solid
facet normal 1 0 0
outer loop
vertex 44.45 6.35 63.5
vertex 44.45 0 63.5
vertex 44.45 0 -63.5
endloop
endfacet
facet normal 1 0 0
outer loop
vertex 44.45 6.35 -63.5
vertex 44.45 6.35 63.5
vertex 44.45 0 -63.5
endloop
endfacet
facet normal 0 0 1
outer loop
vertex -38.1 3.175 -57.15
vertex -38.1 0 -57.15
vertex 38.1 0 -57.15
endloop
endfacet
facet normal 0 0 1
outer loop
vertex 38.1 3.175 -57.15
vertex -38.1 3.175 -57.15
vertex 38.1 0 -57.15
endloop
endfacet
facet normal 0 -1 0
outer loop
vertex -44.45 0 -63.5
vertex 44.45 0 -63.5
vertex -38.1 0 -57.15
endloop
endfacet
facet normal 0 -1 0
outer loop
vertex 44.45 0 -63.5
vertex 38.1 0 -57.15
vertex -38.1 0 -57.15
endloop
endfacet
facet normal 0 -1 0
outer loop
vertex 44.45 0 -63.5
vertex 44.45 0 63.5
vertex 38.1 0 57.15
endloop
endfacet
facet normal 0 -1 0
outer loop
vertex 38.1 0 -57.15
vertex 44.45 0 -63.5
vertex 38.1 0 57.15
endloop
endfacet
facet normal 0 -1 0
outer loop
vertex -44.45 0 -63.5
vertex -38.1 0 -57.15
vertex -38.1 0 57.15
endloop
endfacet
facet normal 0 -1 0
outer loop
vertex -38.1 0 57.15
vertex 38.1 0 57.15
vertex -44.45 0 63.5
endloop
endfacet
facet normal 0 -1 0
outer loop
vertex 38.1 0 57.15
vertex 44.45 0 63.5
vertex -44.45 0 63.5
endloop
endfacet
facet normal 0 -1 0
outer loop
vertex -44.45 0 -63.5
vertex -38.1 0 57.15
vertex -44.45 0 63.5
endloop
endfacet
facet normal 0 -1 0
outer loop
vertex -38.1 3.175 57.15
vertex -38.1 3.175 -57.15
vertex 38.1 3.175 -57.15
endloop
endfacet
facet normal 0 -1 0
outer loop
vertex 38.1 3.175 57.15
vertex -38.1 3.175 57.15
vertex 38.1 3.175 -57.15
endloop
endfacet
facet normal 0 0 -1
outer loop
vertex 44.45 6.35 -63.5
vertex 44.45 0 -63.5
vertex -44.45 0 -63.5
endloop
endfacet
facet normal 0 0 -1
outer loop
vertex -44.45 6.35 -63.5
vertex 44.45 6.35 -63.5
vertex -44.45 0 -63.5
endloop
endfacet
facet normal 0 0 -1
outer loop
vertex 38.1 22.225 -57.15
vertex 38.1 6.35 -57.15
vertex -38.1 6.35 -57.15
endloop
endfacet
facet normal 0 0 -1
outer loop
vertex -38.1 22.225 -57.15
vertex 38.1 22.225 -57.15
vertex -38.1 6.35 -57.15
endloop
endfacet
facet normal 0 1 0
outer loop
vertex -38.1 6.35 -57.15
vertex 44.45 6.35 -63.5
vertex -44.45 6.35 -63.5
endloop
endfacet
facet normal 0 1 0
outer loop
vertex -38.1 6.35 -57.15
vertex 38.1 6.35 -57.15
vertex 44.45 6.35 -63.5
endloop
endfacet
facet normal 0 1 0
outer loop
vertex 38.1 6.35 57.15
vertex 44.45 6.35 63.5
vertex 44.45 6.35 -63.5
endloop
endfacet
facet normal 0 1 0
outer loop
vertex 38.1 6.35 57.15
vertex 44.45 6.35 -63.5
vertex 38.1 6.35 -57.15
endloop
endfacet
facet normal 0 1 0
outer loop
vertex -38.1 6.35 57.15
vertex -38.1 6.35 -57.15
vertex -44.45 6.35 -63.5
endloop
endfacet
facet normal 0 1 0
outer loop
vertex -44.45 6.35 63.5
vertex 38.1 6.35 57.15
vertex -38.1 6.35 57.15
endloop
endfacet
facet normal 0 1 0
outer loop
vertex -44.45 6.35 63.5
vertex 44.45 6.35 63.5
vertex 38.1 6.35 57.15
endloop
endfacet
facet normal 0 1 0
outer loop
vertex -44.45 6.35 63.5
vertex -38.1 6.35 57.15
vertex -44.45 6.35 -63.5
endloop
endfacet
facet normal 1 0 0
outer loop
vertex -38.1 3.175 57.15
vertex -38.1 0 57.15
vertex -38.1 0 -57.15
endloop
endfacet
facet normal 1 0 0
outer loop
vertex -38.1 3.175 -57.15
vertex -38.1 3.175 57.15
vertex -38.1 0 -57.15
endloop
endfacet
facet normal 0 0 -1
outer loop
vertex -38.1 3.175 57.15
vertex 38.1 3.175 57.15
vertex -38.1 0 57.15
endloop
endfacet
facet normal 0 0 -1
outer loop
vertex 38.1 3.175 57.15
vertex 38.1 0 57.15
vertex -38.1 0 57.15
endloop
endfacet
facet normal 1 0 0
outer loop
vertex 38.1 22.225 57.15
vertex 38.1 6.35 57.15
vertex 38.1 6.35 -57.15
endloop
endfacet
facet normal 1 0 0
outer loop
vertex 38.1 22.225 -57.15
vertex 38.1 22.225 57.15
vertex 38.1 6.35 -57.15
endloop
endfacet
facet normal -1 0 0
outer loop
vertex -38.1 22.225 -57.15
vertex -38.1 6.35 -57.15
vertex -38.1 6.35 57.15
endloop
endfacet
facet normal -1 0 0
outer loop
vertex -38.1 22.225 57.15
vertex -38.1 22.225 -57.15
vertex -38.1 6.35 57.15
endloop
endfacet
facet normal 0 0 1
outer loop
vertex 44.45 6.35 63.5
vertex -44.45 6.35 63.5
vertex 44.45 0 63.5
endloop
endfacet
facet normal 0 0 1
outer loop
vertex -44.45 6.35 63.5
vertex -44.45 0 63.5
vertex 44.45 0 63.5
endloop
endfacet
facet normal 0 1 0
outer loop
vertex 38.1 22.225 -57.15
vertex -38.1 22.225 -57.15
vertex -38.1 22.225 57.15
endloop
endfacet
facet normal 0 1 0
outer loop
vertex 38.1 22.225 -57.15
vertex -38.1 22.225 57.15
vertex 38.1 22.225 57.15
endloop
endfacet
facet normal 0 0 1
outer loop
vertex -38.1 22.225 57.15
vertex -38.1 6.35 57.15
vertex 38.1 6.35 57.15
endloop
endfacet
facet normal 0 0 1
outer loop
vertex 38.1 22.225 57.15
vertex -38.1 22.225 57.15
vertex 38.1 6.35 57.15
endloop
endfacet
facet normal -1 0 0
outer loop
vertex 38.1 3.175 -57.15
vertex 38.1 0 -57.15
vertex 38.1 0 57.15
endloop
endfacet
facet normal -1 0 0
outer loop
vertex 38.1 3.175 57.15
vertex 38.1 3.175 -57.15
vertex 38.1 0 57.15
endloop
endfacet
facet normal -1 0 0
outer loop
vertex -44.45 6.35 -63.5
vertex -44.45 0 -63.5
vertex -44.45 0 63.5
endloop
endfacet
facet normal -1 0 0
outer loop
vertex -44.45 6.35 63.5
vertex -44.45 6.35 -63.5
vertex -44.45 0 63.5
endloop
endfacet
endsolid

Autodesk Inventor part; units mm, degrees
ref_plane "YZ Plane" through (0, 0, 0) normal (1, 0, 0) x (0, 1, 0)
ref_plane "XZ Plane" through (0, 0, 0) normal (0, 1, 0) x (-1, 0, 0)
ref_plane "XY Plane" through (0, 0, 0) normal (0, 0, 1) x (1, 0, 0)
sketch "Sketch1" plane through (0, 0, 0) normal (0, 1, 0) x (-1, 0, 0)
  line L0 (-38.1, 57.15) -> (38.1, 57.15)
  line L1 (38.1, 57.15) -> (38.1, -57.15)
  line L2 (38.1, -57.15) -> (-38.1, -57.15)
  line L3 (-38.1, -57.15) -> (-38.1, 57.15)
  line L4 (-38.1, 57.15) -> (38.1, -57.15) construction
  line L5 (38.1, 57.15) -> (-38.1, -57.15) construction
  line L6 (44.45, -63.5) -> (44.45, 63.5)
  line L7 (44.45, 63.5) -> (-44.45, 63.5)
  line L8 (-44.45, 63.5) -> (-44.45, -63.5)
  line L9 (-44.45, -63.5) -> (44.45, -63.5)
  point P0 (0, 0)
  dimension "d0" = 76.2
  dimension "d1" = 114.3
  dimension "d2" = 6.35
extrude "Extrusion1" add sketch "Sketch1" along normal blind 6.35
sketch "Sketch2" plane through (0, 6.35, 0) normal (0, 1, 0) x (1, 0, 0)
  line L0 (-38.1, -57.15) -> (-38.1, 57.15) projected
  line L1 (-38.1, 57.15) -> (38.1, 57.15) projected
  line L2 (38.1, 57.15) -> (38.1, -57.15) projected
  line L3 (38.1, -57.15) -> (-38.1, -57.15) projected
  line L4 (-44.45, 63.5) -> (-44.45, -63.5) projected
  line L5 (-44.45, -63.5) -> (44.45, -63.5) projected
  line L6 (44.45, -63.5) -> (44.45, 63.5) projected
  line L7 (44.45, 63.5) -> (-44.45, 63.5) projected
  point P0 (0, 0)
extrude "Extrusion2" add sketch "Sketch2" along normal mid plane 6.35 contours L0 L1 L2 L3
sketch "Sketch3" plane through (0, 9.525, 0) normal (0, 1, 0) x (1, 0, 0)
  line L0 (-38.1, 57.15) -> (-38.1, -57.15) projected
  line L1 (-38.1, -57.15) -> (38.1, -57.15) projected
  line L2 (38.1, -57.15) -> (38.1, 57.15) projected
  line L3 (38.1, 57.15) -> (-38.1, 57.15) projected
  point P0 (0, 0)
extrude "Extrusion3" add sketch "Sketch3" along normal blind 12.7
properties part number "User Control Panel - Rough"
